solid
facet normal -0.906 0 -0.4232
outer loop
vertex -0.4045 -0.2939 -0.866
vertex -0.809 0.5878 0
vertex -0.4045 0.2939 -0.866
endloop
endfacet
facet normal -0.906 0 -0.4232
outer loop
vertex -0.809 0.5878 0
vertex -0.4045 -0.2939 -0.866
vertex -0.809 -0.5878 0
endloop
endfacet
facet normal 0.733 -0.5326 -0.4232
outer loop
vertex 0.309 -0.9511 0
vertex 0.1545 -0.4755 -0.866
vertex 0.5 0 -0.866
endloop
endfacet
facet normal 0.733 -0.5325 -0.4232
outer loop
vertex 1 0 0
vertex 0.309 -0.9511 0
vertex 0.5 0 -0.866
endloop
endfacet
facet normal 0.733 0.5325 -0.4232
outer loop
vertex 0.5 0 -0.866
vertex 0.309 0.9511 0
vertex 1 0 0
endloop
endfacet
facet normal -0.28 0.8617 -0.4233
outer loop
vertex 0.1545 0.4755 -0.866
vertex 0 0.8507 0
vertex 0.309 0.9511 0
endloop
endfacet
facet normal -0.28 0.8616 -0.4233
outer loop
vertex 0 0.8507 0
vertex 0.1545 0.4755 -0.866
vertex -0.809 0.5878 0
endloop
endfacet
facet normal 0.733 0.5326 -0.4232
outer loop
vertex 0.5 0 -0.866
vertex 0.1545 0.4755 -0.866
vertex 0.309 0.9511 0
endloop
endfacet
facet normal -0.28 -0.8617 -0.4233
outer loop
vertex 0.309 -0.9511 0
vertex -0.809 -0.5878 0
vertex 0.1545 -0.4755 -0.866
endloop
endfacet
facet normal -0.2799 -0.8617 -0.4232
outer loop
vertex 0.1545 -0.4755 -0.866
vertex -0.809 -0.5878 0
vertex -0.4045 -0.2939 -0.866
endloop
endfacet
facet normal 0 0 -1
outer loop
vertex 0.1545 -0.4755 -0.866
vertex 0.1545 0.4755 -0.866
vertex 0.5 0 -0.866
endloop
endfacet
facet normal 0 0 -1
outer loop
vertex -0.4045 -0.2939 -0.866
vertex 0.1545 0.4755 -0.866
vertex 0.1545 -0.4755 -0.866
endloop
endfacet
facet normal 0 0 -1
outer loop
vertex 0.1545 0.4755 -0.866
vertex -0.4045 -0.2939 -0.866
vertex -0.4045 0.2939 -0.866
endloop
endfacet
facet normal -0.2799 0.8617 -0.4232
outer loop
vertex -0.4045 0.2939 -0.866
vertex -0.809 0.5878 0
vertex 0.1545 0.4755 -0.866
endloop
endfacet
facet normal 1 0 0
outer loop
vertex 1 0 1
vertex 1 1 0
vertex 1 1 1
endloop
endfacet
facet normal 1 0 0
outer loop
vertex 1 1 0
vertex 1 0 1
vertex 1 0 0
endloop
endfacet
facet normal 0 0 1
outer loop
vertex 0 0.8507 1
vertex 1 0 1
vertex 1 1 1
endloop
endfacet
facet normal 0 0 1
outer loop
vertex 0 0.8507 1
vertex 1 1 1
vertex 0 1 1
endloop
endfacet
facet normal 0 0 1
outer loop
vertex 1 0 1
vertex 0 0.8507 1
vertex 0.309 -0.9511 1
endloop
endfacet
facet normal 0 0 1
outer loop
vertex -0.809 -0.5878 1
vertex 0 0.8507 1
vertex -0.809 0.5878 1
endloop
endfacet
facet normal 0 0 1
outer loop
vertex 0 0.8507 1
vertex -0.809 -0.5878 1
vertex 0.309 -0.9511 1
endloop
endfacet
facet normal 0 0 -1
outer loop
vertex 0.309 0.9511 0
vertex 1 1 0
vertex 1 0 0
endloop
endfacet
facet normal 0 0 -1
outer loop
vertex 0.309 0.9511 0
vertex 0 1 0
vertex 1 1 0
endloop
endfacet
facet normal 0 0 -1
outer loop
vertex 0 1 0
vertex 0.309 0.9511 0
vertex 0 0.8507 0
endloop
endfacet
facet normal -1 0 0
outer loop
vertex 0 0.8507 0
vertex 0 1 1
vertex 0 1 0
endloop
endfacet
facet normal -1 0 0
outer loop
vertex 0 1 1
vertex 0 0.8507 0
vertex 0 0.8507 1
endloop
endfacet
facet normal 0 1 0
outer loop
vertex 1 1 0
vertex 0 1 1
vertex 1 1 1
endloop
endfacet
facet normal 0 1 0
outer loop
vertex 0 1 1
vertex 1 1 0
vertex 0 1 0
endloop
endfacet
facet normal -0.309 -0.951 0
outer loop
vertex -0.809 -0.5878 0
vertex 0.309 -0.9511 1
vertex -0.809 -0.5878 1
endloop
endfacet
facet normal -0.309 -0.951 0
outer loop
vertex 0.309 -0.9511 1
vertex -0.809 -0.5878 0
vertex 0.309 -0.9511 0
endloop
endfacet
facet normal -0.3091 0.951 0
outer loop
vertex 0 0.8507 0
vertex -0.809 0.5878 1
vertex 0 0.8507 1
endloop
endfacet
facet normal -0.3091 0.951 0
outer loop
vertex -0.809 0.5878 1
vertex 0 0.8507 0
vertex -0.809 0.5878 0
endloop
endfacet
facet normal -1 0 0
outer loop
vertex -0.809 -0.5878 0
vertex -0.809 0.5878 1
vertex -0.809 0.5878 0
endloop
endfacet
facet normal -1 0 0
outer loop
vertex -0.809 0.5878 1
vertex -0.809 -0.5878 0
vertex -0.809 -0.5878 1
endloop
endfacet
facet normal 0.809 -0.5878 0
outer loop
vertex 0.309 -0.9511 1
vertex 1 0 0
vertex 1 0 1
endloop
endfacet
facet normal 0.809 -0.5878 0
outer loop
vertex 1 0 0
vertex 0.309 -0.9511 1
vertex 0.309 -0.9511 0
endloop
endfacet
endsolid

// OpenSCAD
// 3D primatives
// ========================================================
// sphere
sphere( r = 1 );

// cube
cube( [1, 1, 1] );

// cylinder
cylinder( h = 1, r = 1 );

// polyhedron
polyhedron(
  points = [ [0, 0, 0], [0, 1, 0], [1, 0, 0], [0, 0, 1] ],
  faces = [ [0, 1, 2], [0, 1, 3], [1, 2, 3], [0, 2, 3] ]
);
